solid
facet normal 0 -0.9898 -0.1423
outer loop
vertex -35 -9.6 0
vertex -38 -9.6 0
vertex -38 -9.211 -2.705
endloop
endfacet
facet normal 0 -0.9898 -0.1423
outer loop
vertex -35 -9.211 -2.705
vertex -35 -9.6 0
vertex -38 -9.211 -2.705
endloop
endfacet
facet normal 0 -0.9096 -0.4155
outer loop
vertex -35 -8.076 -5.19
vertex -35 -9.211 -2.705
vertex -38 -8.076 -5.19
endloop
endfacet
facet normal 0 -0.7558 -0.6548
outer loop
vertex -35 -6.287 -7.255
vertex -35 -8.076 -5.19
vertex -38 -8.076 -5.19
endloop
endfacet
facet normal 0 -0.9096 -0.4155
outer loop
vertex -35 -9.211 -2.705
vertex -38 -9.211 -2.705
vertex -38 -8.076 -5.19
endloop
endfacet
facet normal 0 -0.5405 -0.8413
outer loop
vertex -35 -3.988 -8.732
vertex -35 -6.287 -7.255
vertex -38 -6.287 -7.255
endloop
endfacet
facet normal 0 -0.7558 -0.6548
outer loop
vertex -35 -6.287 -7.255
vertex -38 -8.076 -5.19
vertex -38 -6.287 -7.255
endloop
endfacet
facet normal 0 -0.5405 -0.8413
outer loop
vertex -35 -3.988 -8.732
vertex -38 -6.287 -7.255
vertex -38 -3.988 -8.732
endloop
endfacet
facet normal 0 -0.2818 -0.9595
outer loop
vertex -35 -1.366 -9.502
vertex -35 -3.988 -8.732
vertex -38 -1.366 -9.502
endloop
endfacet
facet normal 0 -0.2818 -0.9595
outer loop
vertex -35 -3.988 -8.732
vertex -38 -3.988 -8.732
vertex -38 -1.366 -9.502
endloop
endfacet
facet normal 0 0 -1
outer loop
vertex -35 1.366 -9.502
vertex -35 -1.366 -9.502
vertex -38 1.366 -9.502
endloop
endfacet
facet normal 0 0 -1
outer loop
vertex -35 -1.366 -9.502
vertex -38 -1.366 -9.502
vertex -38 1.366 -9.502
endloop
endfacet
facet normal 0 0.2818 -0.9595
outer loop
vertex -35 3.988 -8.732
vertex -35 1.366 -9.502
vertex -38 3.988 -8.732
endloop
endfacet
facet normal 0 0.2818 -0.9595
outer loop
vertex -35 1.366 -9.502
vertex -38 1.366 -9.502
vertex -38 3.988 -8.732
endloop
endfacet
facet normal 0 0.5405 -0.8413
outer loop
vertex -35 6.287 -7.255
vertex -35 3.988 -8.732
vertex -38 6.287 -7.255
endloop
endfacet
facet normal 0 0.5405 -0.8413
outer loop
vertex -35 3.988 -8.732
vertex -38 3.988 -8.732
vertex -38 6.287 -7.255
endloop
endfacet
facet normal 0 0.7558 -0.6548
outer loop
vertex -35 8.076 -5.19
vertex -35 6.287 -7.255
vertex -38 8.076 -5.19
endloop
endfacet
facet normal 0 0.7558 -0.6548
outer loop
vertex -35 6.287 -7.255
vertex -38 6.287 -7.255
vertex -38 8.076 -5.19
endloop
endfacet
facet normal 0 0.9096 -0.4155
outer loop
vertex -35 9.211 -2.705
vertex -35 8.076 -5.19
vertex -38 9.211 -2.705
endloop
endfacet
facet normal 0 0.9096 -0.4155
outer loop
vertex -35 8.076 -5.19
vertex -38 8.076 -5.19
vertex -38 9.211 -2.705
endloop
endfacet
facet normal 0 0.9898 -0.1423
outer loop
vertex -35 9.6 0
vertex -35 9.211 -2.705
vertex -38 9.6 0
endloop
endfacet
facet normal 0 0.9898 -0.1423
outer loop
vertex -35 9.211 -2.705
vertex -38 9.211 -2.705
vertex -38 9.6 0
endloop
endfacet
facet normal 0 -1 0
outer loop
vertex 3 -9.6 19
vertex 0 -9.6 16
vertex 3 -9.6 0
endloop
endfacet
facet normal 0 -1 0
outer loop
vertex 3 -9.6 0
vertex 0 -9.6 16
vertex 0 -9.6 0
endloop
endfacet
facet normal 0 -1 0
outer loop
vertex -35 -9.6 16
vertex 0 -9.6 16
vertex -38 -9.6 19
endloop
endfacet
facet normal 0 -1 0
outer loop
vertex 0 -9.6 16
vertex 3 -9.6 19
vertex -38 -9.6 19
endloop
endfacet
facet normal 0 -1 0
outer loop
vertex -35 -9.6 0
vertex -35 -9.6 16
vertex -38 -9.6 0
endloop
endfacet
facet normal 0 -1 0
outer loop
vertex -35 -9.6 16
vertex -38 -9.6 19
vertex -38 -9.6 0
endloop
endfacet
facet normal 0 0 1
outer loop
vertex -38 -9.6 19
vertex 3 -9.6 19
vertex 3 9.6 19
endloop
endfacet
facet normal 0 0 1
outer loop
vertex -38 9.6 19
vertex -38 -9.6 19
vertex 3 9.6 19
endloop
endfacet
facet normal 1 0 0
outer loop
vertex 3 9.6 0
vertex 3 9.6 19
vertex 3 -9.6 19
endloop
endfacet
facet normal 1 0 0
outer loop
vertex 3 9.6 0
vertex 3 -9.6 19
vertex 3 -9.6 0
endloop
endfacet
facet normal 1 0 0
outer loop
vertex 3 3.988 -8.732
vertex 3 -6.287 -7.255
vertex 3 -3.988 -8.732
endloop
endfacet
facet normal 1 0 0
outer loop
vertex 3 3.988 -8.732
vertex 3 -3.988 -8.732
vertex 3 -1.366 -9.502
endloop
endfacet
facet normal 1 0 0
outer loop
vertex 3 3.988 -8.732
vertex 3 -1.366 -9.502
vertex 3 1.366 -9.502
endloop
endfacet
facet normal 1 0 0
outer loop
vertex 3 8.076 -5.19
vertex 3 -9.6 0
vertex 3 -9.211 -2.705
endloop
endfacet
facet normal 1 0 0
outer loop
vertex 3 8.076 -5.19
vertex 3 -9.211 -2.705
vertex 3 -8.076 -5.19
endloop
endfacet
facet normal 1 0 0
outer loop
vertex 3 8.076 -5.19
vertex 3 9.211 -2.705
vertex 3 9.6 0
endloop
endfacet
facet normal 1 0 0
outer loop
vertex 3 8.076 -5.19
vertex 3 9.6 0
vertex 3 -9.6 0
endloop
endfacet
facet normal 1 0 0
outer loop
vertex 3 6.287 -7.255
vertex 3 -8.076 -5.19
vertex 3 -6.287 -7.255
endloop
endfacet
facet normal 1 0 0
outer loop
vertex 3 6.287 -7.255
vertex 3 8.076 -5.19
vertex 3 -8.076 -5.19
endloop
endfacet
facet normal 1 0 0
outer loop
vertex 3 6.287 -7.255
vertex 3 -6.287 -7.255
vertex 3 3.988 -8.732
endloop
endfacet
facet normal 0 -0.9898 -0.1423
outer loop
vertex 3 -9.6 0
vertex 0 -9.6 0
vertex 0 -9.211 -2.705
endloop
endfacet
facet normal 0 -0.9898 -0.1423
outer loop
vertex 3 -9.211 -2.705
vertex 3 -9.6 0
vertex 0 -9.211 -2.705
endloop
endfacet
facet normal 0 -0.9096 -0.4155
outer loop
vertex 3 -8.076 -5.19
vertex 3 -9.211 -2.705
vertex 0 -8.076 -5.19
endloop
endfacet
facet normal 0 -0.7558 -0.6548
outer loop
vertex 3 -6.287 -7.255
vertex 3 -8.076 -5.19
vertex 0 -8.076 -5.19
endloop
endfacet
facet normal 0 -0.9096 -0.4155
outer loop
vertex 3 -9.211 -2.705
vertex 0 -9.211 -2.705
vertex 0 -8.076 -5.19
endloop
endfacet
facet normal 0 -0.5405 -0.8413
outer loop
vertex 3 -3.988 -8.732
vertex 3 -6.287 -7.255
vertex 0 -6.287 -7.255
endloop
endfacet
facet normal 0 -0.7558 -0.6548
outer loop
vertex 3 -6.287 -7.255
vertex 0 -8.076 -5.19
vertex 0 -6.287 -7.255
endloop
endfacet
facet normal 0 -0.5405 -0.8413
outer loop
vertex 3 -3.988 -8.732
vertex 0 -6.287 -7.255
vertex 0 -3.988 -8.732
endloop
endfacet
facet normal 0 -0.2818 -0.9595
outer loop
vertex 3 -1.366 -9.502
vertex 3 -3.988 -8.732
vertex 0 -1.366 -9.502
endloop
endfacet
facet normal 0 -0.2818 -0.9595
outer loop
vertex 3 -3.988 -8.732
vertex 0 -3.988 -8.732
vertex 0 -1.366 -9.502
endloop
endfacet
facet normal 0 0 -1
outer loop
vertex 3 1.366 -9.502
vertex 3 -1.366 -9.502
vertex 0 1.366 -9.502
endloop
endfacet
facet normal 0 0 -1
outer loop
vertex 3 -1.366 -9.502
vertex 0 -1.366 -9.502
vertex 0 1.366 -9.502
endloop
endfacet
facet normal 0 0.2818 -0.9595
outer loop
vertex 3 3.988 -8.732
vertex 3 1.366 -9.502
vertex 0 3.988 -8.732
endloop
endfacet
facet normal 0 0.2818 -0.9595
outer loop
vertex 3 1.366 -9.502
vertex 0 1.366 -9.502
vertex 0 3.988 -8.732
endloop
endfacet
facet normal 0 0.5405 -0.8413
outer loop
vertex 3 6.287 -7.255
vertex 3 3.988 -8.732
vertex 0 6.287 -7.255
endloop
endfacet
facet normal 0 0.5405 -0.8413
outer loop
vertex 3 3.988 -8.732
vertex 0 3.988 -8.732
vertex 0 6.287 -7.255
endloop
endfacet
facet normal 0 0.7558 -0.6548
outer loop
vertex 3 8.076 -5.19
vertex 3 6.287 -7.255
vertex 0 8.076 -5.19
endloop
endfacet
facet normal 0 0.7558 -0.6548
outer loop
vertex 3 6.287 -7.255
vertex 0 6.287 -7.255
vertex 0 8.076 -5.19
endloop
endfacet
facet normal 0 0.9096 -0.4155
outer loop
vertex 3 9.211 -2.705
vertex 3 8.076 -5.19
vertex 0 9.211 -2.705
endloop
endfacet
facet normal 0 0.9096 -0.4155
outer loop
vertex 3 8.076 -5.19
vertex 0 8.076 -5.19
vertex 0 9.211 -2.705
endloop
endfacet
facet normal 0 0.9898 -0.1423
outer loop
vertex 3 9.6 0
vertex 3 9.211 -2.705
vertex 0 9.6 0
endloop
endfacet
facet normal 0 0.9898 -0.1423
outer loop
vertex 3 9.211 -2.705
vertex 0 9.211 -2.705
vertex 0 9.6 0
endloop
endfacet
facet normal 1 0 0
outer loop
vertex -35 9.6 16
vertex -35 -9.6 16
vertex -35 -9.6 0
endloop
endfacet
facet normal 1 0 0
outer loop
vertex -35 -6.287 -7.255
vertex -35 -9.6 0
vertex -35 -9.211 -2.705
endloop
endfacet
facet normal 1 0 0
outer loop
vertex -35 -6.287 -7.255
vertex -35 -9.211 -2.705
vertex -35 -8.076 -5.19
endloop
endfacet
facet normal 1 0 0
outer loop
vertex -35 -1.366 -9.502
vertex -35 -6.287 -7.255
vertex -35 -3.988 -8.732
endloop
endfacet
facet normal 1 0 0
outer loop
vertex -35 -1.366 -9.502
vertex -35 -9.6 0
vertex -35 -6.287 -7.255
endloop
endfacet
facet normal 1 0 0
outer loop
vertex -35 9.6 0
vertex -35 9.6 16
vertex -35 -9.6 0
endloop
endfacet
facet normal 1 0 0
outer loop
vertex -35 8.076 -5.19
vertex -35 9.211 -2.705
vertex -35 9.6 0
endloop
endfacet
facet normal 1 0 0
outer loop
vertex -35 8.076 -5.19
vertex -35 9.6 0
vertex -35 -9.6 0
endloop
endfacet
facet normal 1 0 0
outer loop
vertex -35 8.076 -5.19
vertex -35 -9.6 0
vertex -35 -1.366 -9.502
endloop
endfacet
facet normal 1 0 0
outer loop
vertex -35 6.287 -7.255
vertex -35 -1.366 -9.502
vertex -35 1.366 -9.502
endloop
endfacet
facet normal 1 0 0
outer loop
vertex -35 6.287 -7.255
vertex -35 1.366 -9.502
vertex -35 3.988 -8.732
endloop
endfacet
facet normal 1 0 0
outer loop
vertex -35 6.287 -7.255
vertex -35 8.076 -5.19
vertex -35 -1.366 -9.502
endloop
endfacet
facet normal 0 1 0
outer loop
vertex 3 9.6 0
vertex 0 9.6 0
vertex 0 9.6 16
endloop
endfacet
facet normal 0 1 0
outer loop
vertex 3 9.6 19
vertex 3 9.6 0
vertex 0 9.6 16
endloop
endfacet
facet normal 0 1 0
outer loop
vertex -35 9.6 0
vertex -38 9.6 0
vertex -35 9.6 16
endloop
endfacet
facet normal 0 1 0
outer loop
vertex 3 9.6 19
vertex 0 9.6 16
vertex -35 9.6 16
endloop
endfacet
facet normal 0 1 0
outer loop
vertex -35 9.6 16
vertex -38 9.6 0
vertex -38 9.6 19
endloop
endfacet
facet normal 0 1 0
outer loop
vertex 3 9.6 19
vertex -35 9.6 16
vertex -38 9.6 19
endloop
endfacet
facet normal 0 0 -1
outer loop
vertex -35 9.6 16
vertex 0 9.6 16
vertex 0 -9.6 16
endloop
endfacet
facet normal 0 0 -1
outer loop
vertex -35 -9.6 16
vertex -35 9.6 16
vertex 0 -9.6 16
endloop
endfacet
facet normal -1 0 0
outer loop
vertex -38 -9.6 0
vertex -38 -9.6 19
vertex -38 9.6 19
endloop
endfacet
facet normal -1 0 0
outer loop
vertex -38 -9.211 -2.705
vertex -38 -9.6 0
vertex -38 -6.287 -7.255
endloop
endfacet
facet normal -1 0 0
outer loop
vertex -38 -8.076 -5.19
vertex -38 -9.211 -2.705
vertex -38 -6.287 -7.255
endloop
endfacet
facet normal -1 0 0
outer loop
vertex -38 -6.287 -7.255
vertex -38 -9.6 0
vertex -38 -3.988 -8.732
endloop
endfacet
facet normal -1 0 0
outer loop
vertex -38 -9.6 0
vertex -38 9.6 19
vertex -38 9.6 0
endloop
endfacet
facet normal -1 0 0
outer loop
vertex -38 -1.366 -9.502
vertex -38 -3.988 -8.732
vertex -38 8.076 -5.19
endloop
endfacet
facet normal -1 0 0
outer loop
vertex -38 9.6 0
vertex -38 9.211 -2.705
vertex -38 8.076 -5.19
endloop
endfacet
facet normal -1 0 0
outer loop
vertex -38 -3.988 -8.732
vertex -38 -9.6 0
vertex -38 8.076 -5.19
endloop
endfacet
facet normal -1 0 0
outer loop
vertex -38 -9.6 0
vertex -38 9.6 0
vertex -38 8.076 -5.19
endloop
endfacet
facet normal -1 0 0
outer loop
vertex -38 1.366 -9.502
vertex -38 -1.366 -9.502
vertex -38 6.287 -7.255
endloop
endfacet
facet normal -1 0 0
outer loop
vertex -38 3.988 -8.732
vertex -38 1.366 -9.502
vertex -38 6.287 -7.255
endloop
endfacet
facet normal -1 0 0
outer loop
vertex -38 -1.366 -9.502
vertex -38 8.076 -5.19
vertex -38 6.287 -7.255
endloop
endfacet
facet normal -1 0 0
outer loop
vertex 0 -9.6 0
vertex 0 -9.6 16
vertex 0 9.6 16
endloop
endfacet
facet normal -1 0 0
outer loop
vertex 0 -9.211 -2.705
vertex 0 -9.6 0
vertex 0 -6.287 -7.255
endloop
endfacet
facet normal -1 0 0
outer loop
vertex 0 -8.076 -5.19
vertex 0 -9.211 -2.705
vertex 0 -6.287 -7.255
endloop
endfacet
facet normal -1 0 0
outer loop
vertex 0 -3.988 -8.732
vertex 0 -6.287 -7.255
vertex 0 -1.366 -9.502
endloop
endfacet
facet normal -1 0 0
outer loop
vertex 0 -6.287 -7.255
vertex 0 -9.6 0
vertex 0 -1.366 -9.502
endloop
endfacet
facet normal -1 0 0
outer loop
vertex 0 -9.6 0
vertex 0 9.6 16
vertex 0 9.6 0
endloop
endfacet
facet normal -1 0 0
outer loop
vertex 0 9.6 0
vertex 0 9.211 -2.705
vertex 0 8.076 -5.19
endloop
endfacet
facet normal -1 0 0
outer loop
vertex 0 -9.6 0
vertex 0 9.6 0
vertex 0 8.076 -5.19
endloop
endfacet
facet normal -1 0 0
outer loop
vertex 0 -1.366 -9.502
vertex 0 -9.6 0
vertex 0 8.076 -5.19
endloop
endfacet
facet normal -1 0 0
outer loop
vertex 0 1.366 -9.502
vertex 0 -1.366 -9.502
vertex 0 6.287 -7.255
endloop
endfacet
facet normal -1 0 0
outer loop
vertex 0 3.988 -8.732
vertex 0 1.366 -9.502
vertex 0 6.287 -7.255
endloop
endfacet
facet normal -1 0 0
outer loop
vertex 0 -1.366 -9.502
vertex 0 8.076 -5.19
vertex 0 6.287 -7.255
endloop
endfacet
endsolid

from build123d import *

# Parameters (mm, degrees)
BOSS_EXTRUDE1_DEPTH = 3
SKETCH1_3_W         = 3
SKETCH1_3_H         = 19.2
BOSS_EXTRUDE2_DEPTH = 38
BOSS_EXTRUDE3_START = -38
BOSS_EXTRUDE3_DEPTH = 38
CUT_EXTRUDE1_START  = -35
CUT_EXTRUDE1_DEPTH  = 35


with BuildPart() as part:
    # Sketch1 → Boss-Extrude1 (new body)
    with BuildSketch(Plane(origin=(0, 0, 0), x_dir=(0, 0, -1), z_dir=(1, 0, 0))):
        with BuildLine():
            ThreePointArc((0, -9.6), (9.6, 0), (0, 9.6))
            Line((0, 9.6), (-19, 9.6))
            Line((-19, 9.6), (-19, -9.6))
            Line((-19, -9.6), (0, -9.6))
        make_face()
    extrude(amount=BOSS_EXTRUDE1_DEPTH)

    # Sketch1<3> → Boss-Extrude2 (add)
    with BuildSketch(Plane(origin=(0, 0, 0), x_dir=(0, 0, -1), z_dir=(1, 0, 0))):
        with Locations((-17.5, 0)):
            Rectangle(SKETCH1_3_W, SKETCH1_3_H)
    extrude(amount=-BOSS_EXTRUDE2_DEPTH)

    # Sketch1<4> → Boss-Extrude3 (add)
    with BuildSketch(Plane(origin=(0, 0, 0), x_dir=(0, 0, -1), z_dir=(1, 0, 0)).offset(BOSS_EXTRUDE3_START)):
        with BuildLine():
            Line((-16, -9.6), (0, -9.6))
            ThreePointArc((0, -9.6), (9.6, 0), (0, 9.6))
            Line((0, 9.6), (-16, 9.6))
            Line((-16, 9.6), (-16, -9.6))
        make_face()
    extrude(amount=BOSS_EXTRUDE3_DEPTH)

    # Sketch1<5> → Cut-Extrude1 (cut)
    with BuildSketch(Plane(origin=(0, 0, 0), x_dir=(0, 0, -1), z_dir=(1, 0, 0)).offset(CUT_EXTRUDE1_START)):
        with BuildLine():
            Line((-16, -9.6), (0, -9.6))
            ThreePointArc((0, -9.6), (9.6, 0), (0, 9.6))
            Line((0, 9.6), (-16, 9.6))
            Line((-16, 9.6), (-16, -9.6))
        make_face()
    extrude(amount=CUT_EXTRUDE1_DEPTH, mode=Mode.SUBTRACT)


solid = part.part
